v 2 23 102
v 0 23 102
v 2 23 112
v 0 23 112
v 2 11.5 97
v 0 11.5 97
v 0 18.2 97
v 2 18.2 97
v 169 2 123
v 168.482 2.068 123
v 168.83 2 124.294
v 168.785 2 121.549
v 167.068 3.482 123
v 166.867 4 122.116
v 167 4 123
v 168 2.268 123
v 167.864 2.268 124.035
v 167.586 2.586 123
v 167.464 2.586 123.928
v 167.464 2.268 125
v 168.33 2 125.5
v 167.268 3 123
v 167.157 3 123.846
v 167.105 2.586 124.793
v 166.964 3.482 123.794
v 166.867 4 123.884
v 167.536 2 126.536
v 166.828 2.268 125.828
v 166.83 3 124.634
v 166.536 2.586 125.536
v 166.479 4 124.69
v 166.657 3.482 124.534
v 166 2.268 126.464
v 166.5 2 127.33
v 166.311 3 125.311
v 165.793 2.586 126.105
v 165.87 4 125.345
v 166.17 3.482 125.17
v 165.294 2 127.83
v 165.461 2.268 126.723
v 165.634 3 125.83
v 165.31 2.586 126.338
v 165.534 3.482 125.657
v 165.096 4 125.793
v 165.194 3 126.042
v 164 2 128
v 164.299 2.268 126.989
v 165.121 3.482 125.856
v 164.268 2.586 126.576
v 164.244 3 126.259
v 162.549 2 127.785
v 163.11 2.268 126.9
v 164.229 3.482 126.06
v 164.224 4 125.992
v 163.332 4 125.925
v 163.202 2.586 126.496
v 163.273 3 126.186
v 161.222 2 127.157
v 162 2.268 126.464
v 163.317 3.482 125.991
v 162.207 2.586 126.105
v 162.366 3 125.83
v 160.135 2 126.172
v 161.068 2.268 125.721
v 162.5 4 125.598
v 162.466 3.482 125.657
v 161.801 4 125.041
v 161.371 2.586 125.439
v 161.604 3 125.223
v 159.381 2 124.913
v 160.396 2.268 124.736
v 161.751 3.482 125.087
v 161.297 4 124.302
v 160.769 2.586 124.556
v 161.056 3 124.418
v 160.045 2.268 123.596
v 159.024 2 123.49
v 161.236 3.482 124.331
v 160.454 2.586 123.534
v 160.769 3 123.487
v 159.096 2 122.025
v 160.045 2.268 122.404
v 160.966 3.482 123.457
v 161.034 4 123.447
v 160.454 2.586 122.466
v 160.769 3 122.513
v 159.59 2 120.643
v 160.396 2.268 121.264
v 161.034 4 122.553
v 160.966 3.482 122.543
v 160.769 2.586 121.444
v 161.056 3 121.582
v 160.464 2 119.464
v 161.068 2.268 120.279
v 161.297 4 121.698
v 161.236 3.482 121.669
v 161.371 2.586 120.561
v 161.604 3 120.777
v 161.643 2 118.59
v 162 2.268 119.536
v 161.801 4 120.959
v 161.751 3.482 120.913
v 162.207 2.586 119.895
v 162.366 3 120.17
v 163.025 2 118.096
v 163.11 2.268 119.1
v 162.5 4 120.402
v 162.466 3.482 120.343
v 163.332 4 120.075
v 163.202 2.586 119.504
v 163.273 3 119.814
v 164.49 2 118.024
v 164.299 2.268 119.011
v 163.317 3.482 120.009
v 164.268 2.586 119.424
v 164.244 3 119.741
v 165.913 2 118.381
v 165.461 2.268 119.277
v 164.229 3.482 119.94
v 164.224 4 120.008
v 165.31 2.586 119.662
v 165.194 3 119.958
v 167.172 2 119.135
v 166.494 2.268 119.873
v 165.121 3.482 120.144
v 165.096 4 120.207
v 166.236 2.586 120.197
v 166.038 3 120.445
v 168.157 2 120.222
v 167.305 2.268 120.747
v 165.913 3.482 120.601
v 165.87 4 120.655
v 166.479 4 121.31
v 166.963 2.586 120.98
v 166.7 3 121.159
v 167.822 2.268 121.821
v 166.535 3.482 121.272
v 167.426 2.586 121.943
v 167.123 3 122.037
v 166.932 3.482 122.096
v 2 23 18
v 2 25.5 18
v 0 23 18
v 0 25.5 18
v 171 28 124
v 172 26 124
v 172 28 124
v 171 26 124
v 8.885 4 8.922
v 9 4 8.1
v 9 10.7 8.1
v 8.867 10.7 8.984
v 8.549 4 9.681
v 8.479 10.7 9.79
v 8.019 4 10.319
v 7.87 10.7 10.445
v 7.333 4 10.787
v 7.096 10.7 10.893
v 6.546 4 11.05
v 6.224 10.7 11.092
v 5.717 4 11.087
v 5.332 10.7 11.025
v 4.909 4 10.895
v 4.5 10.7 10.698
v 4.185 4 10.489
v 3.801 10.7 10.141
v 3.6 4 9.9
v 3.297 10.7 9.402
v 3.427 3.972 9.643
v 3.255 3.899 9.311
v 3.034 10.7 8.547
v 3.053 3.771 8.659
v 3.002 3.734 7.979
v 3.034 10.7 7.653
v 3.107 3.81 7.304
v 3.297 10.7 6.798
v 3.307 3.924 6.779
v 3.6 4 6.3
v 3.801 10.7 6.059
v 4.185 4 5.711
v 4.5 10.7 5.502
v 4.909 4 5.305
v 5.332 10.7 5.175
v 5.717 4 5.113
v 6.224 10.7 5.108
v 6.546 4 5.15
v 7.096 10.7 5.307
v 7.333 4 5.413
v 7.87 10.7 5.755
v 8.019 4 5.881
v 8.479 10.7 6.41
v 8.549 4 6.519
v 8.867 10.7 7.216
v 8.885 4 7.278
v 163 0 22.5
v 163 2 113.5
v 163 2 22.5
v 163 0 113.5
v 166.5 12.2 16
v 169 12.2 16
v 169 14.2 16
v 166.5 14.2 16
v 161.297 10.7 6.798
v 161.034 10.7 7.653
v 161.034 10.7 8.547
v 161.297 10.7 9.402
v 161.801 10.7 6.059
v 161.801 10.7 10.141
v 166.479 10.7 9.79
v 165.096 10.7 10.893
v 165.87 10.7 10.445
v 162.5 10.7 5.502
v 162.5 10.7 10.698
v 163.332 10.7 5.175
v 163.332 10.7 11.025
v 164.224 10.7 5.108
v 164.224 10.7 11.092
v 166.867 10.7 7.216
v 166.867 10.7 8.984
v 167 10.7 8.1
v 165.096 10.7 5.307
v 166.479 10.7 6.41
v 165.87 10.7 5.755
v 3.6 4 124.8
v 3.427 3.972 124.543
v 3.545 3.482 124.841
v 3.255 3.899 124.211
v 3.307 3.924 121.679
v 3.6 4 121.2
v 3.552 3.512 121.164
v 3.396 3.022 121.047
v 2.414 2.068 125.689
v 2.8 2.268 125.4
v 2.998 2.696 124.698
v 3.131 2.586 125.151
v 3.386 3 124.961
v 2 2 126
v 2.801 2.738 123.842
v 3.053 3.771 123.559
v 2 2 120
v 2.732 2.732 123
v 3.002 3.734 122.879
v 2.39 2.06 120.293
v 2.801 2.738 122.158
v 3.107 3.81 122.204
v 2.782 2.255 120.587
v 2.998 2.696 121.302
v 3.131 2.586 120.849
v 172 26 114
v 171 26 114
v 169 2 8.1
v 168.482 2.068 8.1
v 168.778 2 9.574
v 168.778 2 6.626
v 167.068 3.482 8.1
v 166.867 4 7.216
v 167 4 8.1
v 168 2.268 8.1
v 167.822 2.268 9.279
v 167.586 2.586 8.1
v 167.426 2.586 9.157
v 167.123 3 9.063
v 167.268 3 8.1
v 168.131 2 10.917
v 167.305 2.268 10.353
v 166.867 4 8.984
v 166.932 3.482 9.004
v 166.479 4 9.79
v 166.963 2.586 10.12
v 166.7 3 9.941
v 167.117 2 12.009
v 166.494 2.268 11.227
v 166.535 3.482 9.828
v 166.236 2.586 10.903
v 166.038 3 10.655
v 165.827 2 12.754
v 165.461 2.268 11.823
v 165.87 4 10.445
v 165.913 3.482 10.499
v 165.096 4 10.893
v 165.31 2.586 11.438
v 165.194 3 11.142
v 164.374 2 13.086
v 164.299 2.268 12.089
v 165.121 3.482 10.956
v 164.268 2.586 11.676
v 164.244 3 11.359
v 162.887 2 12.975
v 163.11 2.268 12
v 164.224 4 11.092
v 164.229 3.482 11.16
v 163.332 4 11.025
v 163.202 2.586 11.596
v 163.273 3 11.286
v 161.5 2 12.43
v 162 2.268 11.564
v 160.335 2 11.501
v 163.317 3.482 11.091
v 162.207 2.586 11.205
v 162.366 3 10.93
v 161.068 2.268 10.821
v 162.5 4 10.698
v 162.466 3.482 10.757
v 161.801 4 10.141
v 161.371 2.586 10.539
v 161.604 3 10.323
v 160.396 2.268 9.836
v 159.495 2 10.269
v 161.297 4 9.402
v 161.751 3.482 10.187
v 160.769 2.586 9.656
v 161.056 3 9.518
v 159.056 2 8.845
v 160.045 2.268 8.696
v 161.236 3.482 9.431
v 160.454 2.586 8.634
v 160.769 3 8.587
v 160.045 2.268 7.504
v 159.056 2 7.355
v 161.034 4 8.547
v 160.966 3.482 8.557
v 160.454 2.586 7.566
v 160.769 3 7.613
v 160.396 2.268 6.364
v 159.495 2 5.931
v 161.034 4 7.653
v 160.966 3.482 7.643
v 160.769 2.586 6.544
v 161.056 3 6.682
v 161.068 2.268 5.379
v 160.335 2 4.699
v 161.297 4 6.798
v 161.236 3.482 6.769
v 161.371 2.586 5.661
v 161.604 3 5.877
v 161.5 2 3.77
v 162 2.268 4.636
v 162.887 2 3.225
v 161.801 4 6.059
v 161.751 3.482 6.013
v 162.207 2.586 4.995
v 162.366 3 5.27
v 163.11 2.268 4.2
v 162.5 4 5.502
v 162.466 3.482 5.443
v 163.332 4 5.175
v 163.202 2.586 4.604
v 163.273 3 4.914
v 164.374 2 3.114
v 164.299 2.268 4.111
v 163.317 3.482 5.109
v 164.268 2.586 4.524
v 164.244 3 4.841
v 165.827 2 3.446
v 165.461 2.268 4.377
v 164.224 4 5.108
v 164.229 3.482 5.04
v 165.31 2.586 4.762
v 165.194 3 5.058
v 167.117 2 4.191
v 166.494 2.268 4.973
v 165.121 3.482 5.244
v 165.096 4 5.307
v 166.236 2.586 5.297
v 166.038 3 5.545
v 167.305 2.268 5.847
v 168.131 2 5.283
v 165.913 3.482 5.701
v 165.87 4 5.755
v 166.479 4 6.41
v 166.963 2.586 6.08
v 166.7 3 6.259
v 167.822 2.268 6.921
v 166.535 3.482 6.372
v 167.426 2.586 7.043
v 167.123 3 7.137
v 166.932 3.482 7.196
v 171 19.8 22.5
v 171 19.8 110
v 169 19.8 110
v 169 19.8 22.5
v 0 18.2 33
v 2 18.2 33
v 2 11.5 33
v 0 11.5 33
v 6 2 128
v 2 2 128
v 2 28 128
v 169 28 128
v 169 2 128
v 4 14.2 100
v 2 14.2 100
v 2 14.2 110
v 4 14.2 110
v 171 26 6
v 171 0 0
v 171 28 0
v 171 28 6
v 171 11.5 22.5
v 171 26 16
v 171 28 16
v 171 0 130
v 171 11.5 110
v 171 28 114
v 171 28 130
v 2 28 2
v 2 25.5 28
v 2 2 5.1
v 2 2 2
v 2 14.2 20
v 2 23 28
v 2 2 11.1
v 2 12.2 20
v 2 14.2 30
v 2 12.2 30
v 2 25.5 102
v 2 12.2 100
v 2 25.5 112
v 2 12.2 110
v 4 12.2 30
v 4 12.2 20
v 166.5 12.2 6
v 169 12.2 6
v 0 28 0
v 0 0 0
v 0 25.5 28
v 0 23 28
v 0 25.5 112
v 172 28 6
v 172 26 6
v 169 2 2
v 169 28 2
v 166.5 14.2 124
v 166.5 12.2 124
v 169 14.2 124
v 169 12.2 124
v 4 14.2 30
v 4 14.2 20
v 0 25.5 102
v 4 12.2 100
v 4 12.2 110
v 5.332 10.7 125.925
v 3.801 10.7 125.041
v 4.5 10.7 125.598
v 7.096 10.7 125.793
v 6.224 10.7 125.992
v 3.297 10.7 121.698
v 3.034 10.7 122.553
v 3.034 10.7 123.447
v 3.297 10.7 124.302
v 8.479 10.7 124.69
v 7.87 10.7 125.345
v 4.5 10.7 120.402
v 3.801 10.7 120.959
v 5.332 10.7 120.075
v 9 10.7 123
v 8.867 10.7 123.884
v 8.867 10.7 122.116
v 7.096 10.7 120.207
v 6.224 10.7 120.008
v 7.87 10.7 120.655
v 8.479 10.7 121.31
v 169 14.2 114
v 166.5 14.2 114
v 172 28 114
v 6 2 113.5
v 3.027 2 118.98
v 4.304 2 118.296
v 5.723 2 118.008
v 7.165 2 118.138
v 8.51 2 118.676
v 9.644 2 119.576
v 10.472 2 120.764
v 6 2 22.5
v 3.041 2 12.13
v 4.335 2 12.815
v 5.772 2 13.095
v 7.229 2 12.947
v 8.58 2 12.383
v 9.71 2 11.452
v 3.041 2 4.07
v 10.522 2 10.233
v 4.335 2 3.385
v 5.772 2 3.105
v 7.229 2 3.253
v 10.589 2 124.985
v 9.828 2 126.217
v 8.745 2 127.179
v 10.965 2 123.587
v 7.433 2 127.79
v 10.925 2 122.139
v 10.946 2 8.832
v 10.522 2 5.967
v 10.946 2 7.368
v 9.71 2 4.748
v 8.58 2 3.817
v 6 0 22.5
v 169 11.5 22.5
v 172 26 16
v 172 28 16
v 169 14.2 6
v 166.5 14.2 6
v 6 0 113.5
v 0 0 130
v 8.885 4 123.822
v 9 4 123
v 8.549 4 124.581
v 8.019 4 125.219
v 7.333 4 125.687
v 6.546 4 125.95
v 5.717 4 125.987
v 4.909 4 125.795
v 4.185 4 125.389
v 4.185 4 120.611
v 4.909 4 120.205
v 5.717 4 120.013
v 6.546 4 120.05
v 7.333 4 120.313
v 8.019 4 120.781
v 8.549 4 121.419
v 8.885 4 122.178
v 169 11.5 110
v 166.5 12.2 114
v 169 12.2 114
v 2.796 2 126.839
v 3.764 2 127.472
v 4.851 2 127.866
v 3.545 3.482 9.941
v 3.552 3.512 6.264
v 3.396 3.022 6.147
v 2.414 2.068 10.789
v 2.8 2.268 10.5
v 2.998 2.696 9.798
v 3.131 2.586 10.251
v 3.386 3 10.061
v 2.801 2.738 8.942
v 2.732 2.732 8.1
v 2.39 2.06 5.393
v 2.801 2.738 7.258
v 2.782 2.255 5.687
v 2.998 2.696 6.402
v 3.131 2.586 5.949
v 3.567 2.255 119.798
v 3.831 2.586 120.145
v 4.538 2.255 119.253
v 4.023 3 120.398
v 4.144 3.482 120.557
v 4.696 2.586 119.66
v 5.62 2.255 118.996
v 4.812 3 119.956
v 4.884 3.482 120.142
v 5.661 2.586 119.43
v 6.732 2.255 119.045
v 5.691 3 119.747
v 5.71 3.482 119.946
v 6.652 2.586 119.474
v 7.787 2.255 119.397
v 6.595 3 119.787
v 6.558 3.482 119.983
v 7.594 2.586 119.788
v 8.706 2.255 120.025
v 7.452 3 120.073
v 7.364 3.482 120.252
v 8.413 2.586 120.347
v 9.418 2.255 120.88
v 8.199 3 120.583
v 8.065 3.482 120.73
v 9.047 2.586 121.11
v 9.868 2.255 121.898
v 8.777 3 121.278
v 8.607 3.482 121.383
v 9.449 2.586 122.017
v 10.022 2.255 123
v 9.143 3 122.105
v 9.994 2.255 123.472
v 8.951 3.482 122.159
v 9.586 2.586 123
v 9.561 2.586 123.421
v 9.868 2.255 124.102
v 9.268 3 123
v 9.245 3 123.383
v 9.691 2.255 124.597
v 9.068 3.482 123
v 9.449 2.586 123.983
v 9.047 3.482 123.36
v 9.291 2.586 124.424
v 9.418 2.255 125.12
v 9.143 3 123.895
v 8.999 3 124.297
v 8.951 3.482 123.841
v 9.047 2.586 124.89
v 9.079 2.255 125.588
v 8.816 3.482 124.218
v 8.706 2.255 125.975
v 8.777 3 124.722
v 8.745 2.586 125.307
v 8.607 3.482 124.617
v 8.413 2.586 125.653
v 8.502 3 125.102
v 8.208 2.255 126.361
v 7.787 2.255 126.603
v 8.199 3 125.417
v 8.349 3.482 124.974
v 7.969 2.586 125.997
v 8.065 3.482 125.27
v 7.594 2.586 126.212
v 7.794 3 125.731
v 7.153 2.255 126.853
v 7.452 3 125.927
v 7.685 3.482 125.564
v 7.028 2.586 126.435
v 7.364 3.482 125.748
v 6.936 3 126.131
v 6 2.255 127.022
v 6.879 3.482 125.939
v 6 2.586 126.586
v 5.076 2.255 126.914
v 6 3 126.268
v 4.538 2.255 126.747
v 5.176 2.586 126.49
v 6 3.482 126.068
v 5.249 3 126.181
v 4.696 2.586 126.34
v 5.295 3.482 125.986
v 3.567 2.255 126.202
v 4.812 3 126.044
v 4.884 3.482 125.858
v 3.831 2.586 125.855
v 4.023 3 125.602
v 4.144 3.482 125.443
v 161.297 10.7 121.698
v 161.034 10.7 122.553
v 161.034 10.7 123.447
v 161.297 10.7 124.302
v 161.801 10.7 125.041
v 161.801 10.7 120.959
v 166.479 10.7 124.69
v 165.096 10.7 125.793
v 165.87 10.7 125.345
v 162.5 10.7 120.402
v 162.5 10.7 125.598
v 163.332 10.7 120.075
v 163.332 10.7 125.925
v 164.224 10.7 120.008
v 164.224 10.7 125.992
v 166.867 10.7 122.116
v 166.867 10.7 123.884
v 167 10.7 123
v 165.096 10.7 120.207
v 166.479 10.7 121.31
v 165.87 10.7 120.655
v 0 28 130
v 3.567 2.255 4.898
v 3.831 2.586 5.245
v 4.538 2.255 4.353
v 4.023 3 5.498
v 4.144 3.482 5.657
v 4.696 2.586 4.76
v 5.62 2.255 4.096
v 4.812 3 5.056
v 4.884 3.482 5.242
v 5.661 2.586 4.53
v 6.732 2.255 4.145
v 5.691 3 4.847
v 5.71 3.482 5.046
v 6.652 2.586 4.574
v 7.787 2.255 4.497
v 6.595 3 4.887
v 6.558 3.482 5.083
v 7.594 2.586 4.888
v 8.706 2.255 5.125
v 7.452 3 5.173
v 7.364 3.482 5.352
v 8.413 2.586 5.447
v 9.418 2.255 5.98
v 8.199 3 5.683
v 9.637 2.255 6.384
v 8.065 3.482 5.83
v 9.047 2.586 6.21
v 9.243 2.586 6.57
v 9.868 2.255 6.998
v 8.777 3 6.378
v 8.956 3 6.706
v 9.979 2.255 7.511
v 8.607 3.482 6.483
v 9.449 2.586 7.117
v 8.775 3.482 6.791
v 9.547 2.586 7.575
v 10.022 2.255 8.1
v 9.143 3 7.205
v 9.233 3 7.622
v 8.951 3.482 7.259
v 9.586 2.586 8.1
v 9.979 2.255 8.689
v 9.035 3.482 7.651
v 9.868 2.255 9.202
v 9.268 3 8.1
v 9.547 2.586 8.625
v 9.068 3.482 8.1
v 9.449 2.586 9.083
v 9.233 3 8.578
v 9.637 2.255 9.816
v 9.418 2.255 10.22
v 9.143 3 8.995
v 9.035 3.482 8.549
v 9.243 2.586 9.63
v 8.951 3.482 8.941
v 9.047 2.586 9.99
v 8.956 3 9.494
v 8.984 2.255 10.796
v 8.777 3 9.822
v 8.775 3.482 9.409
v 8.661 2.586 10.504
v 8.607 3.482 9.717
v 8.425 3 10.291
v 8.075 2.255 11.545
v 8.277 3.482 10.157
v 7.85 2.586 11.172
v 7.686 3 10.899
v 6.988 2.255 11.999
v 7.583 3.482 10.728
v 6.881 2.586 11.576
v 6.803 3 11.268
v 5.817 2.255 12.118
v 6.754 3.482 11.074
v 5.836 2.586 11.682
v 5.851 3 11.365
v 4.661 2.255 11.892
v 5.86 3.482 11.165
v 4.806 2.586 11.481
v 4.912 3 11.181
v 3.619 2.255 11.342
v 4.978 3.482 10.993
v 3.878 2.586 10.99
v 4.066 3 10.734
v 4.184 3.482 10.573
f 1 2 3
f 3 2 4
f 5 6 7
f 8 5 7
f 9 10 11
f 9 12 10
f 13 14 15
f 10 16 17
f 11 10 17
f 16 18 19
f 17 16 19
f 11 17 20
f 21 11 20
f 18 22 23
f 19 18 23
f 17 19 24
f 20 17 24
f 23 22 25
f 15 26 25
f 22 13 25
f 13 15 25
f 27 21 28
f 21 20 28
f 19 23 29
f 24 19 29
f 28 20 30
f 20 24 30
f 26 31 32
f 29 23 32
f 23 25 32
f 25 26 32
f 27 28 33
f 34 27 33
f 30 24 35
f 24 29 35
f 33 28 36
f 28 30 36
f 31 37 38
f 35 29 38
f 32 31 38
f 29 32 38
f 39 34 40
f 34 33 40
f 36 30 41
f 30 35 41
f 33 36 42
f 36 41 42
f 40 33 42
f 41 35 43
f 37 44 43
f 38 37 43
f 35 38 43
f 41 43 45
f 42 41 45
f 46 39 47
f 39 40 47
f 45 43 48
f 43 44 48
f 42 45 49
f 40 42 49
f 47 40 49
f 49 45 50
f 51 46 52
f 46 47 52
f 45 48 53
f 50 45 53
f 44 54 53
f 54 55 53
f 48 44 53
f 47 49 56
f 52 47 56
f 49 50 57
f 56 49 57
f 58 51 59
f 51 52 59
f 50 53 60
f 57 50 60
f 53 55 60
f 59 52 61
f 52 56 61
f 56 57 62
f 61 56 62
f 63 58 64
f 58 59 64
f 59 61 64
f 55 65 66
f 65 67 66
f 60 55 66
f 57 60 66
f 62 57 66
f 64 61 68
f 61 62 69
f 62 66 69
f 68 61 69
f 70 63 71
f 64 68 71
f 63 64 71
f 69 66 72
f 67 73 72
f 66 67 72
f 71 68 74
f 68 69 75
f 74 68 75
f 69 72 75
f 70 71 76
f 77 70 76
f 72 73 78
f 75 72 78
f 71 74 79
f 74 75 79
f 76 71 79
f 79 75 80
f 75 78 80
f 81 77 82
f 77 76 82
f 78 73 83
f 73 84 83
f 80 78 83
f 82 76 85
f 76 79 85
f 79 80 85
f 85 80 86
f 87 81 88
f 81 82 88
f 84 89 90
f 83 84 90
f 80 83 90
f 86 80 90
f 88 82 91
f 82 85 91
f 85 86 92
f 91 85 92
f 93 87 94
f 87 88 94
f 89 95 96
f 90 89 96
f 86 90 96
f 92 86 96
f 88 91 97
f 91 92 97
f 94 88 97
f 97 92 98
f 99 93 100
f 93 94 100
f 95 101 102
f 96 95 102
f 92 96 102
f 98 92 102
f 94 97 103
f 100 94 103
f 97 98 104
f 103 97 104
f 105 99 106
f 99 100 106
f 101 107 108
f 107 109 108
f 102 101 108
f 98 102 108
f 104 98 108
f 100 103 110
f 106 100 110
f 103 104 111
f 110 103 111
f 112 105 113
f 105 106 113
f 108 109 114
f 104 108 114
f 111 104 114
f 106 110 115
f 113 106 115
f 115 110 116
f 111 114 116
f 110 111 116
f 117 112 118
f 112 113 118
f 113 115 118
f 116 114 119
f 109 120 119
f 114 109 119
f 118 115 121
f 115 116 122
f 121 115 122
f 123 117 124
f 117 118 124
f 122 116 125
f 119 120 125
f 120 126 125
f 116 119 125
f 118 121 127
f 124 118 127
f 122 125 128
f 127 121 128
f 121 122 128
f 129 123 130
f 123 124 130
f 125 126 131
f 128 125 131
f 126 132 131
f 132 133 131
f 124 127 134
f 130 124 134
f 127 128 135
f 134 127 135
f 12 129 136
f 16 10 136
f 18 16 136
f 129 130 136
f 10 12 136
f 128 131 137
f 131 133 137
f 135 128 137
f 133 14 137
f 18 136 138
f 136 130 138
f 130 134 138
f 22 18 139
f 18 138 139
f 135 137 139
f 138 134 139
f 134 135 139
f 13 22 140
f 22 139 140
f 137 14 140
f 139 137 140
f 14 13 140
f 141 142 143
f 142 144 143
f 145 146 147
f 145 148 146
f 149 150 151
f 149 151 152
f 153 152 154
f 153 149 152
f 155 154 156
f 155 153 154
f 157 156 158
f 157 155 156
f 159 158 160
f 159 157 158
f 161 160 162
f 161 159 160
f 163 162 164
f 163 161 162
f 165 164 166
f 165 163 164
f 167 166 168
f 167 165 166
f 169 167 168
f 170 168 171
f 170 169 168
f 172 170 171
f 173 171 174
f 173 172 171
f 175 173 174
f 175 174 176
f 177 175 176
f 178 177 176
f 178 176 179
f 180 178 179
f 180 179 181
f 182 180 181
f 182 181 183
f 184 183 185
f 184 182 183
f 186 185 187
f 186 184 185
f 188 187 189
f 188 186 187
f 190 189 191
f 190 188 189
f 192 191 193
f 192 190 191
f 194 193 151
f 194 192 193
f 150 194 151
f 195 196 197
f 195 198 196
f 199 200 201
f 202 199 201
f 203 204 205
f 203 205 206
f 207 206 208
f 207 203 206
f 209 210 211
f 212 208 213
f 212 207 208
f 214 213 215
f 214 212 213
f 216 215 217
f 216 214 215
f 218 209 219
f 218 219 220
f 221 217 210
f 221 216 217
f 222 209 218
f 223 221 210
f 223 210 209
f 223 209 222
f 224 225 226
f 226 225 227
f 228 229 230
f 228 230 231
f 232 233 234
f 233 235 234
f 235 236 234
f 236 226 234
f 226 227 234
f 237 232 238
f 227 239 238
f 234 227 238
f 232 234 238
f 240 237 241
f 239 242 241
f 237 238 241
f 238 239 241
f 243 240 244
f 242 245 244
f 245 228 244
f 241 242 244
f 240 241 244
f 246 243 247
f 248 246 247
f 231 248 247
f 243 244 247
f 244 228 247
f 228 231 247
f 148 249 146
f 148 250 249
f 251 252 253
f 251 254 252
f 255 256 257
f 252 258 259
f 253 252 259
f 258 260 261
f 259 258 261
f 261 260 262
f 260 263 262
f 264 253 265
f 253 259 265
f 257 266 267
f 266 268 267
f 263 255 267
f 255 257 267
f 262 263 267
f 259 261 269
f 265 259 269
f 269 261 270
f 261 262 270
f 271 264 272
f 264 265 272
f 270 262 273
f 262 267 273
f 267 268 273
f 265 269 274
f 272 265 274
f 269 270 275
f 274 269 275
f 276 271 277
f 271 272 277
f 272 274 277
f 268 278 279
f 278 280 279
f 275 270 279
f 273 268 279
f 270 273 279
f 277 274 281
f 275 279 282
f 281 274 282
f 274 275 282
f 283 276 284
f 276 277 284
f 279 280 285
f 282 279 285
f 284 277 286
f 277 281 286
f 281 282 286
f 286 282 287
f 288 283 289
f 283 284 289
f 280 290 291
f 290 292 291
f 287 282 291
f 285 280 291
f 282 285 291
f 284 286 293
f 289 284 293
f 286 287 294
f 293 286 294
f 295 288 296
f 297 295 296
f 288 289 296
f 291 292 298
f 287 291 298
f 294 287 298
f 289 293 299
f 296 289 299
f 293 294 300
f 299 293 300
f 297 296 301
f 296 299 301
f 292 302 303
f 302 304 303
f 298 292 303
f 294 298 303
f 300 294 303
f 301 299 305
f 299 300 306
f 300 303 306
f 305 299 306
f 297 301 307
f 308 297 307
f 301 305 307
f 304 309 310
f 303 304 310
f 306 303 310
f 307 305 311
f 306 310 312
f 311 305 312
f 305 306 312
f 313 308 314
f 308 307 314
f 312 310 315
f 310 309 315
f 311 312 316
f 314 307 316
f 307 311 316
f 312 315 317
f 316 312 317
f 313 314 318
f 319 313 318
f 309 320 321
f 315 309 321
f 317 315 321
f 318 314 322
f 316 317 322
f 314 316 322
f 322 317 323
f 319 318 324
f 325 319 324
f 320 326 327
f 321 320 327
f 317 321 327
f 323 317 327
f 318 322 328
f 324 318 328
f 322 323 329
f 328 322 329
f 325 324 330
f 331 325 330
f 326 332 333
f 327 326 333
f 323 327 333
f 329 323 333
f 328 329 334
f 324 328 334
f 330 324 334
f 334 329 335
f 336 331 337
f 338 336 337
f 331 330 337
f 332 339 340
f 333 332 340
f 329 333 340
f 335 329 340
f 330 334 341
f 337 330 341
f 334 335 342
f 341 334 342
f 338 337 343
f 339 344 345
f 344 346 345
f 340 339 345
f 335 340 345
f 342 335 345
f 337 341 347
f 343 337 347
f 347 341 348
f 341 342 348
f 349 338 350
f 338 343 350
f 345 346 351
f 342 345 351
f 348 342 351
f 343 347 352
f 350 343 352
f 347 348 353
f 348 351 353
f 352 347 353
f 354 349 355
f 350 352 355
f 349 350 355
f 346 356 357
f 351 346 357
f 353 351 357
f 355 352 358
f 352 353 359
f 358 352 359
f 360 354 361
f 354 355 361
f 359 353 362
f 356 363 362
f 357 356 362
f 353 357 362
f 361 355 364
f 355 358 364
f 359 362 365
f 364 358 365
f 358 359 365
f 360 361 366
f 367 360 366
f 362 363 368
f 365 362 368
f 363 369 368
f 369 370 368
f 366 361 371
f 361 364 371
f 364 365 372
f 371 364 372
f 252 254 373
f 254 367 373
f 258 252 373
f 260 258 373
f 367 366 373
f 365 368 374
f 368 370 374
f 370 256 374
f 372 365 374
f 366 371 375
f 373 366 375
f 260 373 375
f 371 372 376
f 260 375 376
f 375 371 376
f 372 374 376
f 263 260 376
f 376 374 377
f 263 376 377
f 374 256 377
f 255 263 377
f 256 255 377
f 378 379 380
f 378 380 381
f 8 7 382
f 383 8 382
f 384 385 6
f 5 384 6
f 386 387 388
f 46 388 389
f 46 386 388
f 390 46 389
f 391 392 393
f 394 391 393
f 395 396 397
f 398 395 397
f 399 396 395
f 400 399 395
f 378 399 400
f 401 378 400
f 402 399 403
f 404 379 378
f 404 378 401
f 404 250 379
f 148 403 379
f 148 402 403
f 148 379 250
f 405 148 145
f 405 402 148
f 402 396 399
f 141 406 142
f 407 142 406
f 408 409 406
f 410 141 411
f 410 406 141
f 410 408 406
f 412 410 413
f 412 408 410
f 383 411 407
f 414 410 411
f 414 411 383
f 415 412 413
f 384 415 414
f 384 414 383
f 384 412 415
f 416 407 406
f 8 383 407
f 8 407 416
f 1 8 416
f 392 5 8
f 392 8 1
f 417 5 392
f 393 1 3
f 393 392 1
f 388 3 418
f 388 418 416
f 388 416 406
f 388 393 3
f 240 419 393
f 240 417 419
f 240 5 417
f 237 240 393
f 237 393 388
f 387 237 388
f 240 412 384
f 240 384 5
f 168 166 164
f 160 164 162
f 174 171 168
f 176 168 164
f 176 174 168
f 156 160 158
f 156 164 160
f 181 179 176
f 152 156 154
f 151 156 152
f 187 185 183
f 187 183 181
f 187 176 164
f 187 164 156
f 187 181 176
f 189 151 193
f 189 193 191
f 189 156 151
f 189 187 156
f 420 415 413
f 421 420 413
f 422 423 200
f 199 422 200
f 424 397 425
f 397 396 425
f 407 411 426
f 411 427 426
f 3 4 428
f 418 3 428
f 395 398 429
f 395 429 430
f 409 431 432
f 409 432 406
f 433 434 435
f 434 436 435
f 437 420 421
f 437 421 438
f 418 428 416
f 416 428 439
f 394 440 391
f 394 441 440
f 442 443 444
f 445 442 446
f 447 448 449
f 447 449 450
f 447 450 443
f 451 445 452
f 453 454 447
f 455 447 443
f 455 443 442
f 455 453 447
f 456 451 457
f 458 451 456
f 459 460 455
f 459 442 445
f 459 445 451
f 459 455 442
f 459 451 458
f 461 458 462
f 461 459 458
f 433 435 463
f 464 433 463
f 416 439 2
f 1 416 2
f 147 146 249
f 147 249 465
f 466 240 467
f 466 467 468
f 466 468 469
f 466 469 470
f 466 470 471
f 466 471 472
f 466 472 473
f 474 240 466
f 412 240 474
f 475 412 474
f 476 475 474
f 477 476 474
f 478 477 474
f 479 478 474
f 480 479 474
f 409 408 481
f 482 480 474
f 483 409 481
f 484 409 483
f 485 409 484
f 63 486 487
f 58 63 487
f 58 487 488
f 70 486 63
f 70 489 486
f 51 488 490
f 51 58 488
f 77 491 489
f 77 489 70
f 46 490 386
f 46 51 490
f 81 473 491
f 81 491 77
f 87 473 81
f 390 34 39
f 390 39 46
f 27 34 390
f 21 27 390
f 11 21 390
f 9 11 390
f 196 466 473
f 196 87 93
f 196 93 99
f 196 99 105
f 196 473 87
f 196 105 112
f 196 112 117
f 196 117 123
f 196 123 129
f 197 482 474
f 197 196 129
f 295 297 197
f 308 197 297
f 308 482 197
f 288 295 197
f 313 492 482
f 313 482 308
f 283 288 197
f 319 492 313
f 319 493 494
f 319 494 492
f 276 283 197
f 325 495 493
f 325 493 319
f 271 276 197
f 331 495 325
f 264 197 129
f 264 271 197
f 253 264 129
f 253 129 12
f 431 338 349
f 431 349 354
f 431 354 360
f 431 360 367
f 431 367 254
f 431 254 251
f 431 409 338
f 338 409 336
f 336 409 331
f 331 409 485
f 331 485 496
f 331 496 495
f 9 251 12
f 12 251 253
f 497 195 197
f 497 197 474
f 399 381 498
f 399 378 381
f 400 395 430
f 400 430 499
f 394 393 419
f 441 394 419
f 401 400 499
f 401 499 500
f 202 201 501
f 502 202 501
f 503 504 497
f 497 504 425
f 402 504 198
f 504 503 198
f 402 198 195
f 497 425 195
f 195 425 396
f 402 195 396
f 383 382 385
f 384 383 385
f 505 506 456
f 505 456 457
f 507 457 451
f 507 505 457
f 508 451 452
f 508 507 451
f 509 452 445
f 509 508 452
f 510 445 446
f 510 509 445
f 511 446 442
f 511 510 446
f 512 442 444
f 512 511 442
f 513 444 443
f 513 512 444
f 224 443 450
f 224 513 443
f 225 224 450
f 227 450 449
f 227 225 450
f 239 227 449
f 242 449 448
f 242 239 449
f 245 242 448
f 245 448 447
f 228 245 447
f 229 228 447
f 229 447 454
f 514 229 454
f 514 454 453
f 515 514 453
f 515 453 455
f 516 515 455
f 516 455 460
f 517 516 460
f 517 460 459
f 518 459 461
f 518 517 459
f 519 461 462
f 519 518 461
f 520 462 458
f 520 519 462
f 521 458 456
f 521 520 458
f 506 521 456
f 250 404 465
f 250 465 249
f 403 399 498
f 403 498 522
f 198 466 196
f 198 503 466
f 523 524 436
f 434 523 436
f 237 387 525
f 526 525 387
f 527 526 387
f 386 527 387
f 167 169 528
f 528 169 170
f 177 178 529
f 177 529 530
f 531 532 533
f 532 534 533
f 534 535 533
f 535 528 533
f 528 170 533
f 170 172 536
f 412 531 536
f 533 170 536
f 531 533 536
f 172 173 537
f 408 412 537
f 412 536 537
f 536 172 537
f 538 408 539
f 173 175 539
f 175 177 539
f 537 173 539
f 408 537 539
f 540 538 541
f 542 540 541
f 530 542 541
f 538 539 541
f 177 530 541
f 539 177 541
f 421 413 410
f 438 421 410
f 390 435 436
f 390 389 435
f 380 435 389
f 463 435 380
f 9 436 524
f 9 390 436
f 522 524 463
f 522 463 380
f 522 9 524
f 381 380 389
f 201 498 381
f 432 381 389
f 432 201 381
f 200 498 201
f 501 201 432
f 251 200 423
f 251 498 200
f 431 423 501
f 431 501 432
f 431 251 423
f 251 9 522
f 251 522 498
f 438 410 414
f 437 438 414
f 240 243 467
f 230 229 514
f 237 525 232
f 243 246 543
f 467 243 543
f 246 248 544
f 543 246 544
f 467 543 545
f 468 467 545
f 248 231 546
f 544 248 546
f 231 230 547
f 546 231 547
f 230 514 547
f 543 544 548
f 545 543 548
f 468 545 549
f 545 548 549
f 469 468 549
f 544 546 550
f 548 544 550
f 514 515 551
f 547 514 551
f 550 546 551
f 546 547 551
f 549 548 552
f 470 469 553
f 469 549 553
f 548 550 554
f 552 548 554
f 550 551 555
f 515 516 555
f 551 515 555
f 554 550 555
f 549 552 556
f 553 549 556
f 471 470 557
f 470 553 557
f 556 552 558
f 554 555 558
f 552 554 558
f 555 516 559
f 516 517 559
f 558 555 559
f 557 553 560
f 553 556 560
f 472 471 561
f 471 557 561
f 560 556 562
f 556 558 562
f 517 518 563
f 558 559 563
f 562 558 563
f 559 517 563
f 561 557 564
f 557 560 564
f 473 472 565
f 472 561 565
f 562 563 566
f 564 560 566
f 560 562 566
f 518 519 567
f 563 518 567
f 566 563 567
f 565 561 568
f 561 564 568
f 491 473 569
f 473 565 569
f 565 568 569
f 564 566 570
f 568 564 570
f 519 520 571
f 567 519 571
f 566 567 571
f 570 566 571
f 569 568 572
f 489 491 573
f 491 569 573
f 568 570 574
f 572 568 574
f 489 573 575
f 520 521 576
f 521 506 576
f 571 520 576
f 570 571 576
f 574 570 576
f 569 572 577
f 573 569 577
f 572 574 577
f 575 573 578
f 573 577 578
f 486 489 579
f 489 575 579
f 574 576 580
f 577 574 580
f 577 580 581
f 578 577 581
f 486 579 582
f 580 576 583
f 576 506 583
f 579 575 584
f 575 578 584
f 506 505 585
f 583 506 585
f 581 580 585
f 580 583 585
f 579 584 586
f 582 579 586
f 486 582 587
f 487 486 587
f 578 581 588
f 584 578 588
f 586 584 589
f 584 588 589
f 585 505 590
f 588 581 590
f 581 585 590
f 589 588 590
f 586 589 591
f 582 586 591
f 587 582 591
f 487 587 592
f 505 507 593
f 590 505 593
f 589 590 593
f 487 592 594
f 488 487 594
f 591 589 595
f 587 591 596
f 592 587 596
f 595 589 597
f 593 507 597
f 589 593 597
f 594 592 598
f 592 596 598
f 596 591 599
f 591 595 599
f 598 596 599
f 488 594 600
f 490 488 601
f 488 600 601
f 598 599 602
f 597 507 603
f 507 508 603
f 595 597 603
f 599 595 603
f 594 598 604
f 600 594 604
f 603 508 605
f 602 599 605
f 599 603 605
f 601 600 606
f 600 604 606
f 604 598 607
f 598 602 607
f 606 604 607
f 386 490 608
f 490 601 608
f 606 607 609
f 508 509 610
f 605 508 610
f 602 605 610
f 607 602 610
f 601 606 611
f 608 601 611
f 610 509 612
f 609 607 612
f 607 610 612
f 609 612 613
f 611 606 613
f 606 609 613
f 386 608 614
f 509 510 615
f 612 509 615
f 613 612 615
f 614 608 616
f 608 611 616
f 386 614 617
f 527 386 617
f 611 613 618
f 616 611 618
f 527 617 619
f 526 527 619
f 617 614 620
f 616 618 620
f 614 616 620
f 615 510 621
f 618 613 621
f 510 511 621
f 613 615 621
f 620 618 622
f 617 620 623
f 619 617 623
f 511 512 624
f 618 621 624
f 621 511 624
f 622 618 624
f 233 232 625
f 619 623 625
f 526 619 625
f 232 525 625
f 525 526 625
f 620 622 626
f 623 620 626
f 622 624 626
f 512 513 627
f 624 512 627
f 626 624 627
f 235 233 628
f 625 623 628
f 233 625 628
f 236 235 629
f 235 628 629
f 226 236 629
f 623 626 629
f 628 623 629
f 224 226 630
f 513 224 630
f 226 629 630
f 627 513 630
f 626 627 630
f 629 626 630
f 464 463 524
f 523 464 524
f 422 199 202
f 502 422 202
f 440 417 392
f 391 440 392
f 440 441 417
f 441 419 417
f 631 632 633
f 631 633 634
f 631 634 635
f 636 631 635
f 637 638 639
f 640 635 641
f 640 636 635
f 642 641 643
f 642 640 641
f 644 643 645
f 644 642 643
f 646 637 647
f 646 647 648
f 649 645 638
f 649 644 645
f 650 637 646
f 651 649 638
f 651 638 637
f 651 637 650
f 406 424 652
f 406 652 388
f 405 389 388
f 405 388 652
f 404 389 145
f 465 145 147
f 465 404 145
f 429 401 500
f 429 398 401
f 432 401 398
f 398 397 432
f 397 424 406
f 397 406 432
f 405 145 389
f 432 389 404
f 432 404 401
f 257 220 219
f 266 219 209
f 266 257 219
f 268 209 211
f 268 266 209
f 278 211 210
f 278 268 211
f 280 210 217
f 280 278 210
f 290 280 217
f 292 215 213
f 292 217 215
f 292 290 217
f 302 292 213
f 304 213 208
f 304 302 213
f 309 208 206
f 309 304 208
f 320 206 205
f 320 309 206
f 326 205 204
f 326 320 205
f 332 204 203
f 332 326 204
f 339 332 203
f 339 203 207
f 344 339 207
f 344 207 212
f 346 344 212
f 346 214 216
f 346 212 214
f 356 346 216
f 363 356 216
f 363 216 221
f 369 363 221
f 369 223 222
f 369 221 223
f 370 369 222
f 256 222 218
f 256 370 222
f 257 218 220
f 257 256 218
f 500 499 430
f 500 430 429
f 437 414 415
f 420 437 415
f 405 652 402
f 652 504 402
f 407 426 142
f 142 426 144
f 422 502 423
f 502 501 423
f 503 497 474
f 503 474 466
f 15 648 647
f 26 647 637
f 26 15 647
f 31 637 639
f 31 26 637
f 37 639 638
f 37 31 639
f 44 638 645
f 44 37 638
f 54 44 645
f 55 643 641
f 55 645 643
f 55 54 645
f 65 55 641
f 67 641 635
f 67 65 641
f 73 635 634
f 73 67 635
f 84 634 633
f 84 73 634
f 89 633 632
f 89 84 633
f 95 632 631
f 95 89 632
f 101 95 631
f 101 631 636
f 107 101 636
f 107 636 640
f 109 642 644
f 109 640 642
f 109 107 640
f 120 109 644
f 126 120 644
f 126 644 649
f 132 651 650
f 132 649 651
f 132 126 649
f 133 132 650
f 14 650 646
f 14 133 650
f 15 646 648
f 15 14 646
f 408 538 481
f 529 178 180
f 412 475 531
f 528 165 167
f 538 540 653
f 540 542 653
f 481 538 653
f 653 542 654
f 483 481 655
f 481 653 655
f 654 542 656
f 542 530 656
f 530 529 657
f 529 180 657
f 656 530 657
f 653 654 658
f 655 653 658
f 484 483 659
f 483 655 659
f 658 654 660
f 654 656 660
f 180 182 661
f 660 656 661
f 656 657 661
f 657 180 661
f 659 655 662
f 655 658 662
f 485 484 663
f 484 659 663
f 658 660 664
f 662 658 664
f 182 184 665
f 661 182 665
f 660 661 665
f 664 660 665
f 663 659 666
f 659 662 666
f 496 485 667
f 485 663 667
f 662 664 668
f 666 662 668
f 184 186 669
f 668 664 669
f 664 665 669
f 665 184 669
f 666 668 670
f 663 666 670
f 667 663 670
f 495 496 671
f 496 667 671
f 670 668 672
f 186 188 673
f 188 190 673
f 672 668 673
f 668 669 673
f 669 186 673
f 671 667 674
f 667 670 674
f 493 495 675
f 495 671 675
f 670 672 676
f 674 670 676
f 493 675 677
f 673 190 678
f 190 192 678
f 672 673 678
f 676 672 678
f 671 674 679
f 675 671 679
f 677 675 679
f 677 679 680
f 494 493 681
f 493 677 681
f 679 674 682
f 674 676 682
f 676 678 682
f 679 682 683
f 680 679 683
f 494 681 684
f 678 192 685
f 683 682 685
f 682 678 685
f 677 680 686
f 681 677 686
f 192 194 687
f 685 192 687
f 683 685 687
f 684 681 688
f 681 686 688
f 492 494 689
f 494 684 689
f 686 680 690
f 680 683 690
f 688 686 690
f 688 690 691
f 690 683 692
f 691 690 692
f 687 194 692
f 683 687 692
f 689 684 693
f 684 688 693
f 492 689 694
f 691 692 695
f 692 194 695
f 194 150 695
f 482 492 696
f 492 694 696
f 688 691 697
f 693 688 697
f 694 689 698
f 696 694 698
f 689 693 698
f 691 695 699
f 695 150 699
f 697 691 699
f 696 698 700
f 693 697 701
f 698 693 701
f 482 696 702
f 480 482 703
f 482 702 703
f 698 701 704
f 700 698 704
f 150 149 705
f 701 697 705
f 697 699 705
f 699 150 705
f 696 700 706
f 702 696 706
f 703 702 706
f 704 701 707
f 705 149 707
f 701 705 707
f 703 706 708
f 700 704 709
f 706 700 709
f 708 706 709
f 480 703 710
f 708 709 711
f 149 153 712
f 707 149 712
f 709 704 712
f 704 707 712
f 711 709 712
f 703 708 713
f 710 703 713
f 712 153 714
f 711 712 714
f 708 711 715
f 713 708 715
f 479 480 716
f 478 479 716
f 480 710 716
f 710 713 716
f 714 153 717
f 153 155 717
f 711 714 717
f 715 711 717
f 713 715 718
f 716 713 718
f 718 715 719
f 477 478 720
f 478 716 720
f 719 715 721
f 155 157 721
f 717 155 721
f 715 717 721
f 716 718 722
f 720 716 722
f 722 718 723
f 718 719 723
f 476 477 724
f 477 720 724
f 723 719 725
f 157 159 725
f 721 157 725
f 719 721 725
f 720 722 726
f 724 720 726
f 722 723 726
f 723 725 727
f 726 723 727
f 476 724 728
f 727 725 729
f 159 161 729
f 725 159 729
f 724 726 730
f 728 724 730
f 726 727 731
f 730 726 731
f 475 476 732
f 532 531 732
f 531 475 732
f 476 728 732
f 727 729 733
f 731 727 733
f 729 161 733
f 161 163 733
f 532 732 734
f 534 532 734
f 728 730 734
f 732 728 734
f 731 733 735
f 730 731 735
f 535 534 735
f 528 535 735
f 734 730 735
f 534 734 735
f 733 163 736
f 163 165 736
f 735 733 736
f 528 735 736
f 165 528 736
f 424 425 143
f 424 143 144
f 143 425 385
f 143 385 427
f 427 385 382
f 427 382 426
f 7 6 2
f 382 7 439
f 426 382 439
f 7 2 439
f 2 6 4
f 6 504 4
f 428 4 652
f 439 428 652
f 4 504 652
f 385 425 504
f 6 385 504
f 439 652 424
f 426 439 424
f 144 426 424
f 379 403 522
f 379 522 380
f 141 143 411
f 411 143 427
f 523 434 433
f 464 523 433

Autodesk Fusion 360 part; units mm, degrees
sketch "Sketch1" plane through (0, 0, 0) normal (0, 1, 0) x (1, 0, 0)
  line L0 (0, -130) -> (171, -130)
  line L1 (171, -130) -> (171, 0)
  line L2 (171, 0) -> (0, 0)
  line L3 (0, 0) -> (0, -130)
  line L4 (6, -113.5) -> (163, -113.5)
  line L5 (163, -113.5) -> (163, -22.5)
  line L6 (163, -22.5) -> (6, -22.5)
  line L7 (6, -22.5) -> (6, -113.5)
  line L8 (2, -128) -> (169, -128)
  line L9 (169, -128) -> (169, -2)
  line L10 (169, -2) -> (2, -2)
  line L11 (2, -2) -> (2, -128)
  circle A0 centre (6, -8.1) radius 3
  circle A1 centre (164, -8.1) radius 3
  circle A2 centre (6, -123) radius 3
  circle A3 centre (164, -123) radius 3
  dimension "d1" = 171
  dimension "d2" = 130
  dimension "d3" = 157
  dimension "d4" = 91
  dimension "d6" = 16.5
  dimension "d7" = 167
  dimension "d8" = 126
  dimension "d9" = 2
  dimension "d10" = 2
  dimension "d15" = 6
  dimension "d17" = 14.4
  dimension "d18" = 6
  dimension "d19" = 158
  dimension "d20" = 6
  dimension "d21" = 6
  dimension "d22" = 158
  dimension "d25" = 7
  dimension "d37" = 14.4
  dimension "d39" = 7
  dimension "d40" = 114.9
extrude "Extrude1" add sketch "Sketch1" along normal blind 28 contours L0 L1 L2 L3
extrude "Extrude2" add sketch "Sketch1" along normal blind 2 contours L8 L9 L10 L11 | A0 | A1 | A2 | A3
extrude "Extrude4" add sketch "Sketch1" along normal blind 10.7 contours A3
extrude "Extrude5" add sketch "Sketch1" along normal blind 10.7 contours A2
extrude "Extrude6" add sketch "Sketch1" along normal blind 10.7 contours A0
extrude "Extrude7" add sketch "Sketch1" along normal blind 10.7 contours A1
fillet "Fillet1" radius 2 1 edges at (161.203, 2, 121.9152)
fillet "Fillet2" radius 2 1 edges at (3.203, 2, 121.9152)
fillet "Fillet3" radius 2 1 edges at (3.203, 2, 7.0152)
fillet "Fillet4" radius 2 1 edges at (161.203, 2, 7.0152)
sketch "Right - Buttons" plane through (0, 0, 0) normal (1, 0, 0) x (0, 1, 0)
  line L0 (11.5, 97) -> (18.2, 97)
  line L1 (18.2, 97) -> (18.2, 33)
  line L2 (18.2, 33) -> (11.5, 33)
  line L3 (11.5, 33) -> (11.5, 97)
  line L4 (0, 0) -> (28, 0)
  line L5 (14.2, 110) -> (12.2, 110)
  line L6 (12.2, 110) -> (12.2, 100)
  line L7 (12.2, 100) -> (14.2, 100)
  line L8 (14.2, 100) -> (14.2, 110)
  line L9 (0, 130) -> (28, 130)
  line L10 (14.2, 30) -> (12.2, 30)
  line L11 (12.2, 30) -> (12.2, 20)
  line L12 (12.2, 20) -> (14.2, 20)
  line L13 (14.2, 20) -> (14.2, 30)
  line L14 (23, 112) -> (25.5, 112)
  line L15 (25.5, 112) -> (25.5, 102)
  line L16 (25.5, 102) -> (23, 102)
  line L17 (23, 102) -> (23, 112)
  line L18 (28, 0) -> (28, 130)
  line L19 (23, 28) -> (25.5, 28)
  line L20 (25.5, 28) -> (25.5, 18)
  line L21 (25.5, 18) -> (23, 18)
  line L22 (23, 18) -> (23, 28)
  dimension "d49" = 6.7
  dimension "d50" = 64
  dimension "d51" = 33
  dimension "d52" = 11.5
  dimension "d73" = 2
  dimension "d74" = 10
  dimension "d75" = 12.2
  dimension "d76" = 20
  dimension "d77" = 2
  dimension "d78" = 10
  dimension "d79" = 12.2
  dimension "d80" = 20
  dimension "d91" = 2.5
  dimension "d92" = 10
  dimension "d93" = 2.5
  dimension "d94" = 18
  dimension "d95" = 2.5
  dimension "d96" = 10
  dimension "d97" = 2.5
  dimension "d98" = 18
extrude "Extrude8" cut sketch "Right - Buttons" along normal blind 10 contours L0 L1 L2 L3
sketch "Left - HDMI" plane through (171, 0, 0) normal (1, 0, 0) x (0, 1, 0)
  line L0 (0, 130) -> (0, 0)
  line L1 (0, 0) -> (28, 0)
  line L2 (28, 0) -> (28, 130)
  line L3 (28, 130) -> (0, 130)
  line L4 (11.5, 110) -> (19.8, 110)
  line L5 (19.8, 110) -> (19.8, 22.5)
  line L6 (19.8, 22.5) -> (11.5, 22.5)
  line L7 (11.5, 22.5) -> (11.5, 110)
  line L8 (12.2, 124) -> (14.2, 124)
  line L9 (14.2, 124) -> (14.2, 114)
  line L10 (14.2, 114) -> (12.2, 114)
  line L11 (12.2, 114) -> (12.2, 124)
  line L12 (12.2, 16) -> (14.2, 16)
  line L13 (14.2, 16) -> (14.2, 6)
  line L14 (14.2, 6) -> (12.2, 6)
  line L15 (12.2, 6) -> (12.2, 16)
  line L16 (26, 124) -> (28, 124)
  line L17 (28, 124) -> (28, 114)
  line L18 (28, 114) -> (26, 114)
  line L19 (26, 114) -> (26, 124)
  line L20 (26, 16) -> (28, 16)
  line L21 (28, 16) -> (28, 6)
  line L22 (28, 6) -> (26, 6)
  line L23 (26, 6) -> (26, 16)
  dimension "d55" = 8.3
  dimension "d56" = 87.5
  dimension "d57" = 22.5
  dimension "d58" = 11.5
  dimension "d61" = 2
  dimension "d62" = 10
  dimension "d63" = 12.2
  dimension "d64" = 6
  dimension "d65" = 2
  dimension "d66" = 10
  dimension "d67" = 12.2
  dimension "d68" = 6
  dimension "d103" = 2
  dimension "d104" = 10
  dimension "d106" = 2
  dimension "d107" = 10
extrude "Extrude9" cut sketch "Left - HDMI" against normal blind 5 contours L4 L5 L6 L7
extrude "Extrude10" add sketch "Left - HDMI" against normal blind 4.5 contours L8 L9 L10 L11
extrude "Extrude11" add sketch "Left - HDMI" against normal blind 4.5 contours L12 L13 L14 L15
extrude "Extrude12" add sketch "Right - Buttons" along normal blind 4 contours L5 L6 L7 L8
extrude "Extrude13" add sketch "Right - Buttons" along normal blind 4 contours L10 L11 L12 L13
extrude "Extrude14" cut sketch "Right - Buttons" along normal blind 3 contours L14 L15 L16 L17
extrude "Extrude15" cut sketch "Right - Buttons" along normal blind 3 contours L19 L20 L21 L22
extrude "Extrude16" add sketch "Left - HDMI" along normal blind 1 contours L2 L16 L17 L18 L19
extrude "Extrude17" add sketch "Left - HDMI" along normal blind 1 contours L2 L20 L21 L22 L23
